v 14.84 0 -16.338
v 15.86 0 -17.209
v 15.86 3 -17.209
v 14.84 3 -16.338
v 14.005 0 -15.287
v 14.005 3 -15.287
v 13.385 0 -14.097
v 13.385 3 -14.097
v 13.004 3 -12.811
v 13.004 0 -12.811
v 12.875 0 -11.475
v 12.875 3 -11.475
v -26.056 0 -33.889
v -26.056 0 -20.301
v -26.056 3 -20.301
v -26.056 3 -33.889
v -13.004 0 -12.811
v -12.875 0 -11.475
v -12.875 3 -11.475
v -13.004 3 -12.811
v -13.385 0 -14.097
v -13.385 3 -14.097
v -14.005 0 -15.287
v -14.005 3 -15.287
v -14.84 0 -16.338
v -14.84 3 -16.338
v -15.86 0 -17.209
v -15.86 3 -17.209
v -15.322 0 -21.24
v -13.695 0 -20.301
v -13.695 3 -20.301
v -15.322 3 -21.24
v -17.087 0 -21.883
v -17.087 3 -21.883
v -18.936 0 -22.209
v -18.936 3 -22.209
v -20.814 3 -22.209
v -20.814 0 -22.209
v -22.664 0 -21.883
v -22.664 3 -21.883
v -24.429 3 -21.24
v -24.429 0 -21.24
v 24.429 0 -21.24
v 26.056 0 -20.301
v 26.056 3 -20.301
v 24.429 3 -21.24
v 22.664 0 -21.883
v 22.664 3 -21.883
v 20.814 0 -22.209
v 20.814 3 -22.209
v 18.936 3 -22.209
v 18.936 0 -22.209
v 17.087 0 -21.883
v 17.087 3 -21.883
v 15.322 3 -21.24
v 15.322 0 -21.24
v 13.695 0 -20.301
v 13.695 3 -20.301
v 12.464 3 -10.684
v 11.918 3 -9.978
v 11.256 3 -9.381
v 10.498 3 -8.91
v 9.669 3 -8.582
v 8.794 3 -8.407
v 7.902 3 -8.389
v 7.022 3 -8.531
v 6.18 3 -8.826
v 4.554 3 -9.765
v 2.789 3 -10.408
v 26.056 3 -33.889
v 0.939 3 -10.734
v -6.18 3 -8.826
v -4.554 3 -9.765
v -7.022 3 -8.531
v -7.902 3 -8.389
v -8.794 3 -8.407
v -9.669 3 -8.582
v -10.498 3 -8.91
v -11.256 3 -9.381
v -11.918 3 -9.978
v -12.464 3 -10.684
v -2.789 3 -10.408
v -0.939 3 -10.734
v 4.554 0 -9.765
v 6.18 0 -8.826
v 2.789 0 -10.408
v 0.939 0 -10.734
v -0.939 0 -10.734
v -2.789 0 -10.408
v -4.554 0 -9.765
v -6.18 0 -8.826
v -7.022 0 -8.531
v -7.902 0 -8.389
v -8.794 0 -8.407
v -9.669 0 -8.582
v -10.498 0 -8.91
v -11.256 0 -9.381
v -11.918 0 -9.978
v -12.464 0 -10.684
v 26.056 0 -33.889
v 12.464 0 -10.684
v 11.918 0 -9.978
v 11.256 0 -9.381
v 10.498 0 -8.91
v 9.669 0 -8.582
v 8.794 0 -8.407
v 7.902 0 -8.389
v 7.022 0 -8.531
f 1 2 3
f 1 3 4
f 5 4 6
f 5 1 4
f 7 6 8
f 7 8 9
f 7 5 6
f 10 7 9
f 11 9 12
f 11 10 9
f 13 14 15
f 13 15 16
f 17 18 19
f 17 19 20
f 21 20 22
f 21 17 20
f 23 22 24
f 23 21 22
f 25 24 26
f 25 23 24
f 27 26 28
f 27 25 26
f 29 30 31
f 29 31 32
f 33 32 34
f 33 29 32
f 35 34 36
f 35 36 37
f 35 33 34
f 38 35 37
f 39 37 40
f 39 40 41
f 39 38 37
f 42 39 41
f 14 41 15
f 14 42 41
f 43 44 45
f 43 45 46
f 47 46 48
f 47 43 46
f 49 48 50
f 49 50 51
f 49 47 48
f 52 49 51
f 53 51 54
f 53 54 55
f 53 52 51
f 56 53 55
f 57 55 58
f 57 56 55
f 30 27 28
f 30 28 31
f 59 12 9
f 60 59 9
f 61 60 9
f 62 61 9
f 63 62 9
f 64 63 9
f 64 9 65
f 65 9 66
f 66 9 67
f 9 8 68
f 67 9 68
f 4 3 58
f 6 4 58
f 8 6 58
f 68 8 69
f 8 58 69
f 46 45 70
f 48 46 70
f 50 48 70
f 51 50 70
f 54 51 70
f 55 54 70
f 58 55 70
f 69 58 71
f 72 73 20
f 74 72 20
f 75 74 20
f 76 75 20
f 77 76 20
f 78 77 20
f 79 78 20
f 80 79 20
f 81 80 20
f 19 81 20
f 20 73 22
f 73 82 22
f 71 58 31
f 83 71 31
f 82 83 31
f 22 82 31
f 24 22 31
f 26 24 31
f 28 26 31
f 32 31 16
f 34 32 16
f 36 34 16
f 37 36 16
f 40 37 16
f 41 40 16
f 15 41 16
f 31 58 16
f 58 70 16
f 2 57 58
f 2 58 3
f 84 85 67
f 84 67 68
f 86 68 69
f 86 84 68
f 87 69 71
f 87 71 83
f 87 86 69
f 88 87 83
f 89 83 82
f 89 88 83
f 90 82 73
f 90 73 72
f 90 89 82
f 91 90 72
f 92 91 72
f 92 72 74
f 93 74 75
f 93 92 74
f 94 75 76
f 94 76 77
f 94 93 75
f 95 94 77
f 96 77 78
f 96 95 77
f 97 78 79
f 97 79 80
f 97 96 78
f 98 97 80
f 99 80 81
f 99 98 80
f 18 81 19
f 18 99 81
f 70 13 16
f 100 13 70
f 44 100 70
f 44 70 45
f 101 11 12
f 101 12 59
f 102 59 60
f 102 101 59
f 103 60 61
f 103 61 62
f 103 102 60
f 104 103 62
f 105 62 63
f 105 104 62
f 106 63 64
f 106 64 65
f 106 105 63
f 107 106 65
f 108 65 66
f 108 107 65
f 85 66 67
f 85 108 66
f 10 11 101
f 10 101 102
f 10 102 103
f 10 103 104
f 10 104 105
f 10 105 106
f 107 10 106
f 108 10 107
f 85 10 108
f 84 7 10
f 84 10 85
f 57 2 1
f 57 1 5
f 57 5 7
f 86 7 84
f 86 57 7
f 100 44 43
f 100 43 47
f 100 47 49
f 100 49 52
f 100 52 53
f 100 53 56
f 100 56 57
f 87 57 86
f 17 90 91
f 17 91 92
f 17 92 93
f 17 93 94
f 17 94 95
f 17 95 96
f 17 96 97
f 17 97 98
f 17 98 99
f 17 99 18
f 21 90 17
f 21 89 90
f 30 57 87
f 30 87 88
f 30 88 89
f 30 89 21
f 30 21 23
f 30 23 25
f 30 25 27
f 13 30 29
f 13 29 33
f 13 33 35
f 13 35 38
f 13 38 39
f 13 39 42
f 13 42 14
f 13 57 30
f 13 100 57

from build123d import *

# Parameters (mm, degrees)
BOSS_EXTRUDE1_DEPTH = 3


with BuildPart() as part:
    # Sketch2 → Boss-Extrude1 (new body)
    with BuildSketch(Plane(origin=(0, 0, 0), x_dir=(1, 0, 0), z_dir=(0, 1, 0))):
        with BuildLine():
            Line((-15.860247962, 17.20906431), (-13.694996915, 20.301363277))
            ThreePointArc((-13.694996915, 20.301363277), (-19.875283017, 22.25), (-26.055569119, 20.301363277))
            Line((-26.055569119, 20.301363277), (-26.055569119, 33.889213566))
            Line((-26.055569119, 33.889213566), (26.055569119, 33.889213566))
            Line((26.055569119, 33.889213566), (26.055569119, 20.301363277))
            ThreePointArc((26.055569119, 20.301363277), (19.875283017, 22.25), (13.694996915, 20.301363277))
            Line((13.694996915, 20.301363277), (15.860247962, 17.20906431))
            ThreePointArc((15.860247962, 17.20906431), (13.666207185, 14.707240293), (12.875283017, 11.475))
            ThreePointArc((12.875283017, 11.475), (10.090653959, 8.727908609), (6.180286102, 8.826363277))
            ThreePointArc((6.180286102, 8.826363277), (0, 10.775), (-6.180286102, 8.826363277))
            ThreePointArc((-6.180286102, 8.826363277), (-10.090653959, 8.727908609), (-12.875283017, 11.475))
            ThreePointArc((-12.875283017, 11.475), (-13.666207185, 14.707240293), (-15.860247962, 17.20906431))
        make_face()
    extrude(amount=BOSS_EXTRUDE1_DEPTH)


solid = part.part
